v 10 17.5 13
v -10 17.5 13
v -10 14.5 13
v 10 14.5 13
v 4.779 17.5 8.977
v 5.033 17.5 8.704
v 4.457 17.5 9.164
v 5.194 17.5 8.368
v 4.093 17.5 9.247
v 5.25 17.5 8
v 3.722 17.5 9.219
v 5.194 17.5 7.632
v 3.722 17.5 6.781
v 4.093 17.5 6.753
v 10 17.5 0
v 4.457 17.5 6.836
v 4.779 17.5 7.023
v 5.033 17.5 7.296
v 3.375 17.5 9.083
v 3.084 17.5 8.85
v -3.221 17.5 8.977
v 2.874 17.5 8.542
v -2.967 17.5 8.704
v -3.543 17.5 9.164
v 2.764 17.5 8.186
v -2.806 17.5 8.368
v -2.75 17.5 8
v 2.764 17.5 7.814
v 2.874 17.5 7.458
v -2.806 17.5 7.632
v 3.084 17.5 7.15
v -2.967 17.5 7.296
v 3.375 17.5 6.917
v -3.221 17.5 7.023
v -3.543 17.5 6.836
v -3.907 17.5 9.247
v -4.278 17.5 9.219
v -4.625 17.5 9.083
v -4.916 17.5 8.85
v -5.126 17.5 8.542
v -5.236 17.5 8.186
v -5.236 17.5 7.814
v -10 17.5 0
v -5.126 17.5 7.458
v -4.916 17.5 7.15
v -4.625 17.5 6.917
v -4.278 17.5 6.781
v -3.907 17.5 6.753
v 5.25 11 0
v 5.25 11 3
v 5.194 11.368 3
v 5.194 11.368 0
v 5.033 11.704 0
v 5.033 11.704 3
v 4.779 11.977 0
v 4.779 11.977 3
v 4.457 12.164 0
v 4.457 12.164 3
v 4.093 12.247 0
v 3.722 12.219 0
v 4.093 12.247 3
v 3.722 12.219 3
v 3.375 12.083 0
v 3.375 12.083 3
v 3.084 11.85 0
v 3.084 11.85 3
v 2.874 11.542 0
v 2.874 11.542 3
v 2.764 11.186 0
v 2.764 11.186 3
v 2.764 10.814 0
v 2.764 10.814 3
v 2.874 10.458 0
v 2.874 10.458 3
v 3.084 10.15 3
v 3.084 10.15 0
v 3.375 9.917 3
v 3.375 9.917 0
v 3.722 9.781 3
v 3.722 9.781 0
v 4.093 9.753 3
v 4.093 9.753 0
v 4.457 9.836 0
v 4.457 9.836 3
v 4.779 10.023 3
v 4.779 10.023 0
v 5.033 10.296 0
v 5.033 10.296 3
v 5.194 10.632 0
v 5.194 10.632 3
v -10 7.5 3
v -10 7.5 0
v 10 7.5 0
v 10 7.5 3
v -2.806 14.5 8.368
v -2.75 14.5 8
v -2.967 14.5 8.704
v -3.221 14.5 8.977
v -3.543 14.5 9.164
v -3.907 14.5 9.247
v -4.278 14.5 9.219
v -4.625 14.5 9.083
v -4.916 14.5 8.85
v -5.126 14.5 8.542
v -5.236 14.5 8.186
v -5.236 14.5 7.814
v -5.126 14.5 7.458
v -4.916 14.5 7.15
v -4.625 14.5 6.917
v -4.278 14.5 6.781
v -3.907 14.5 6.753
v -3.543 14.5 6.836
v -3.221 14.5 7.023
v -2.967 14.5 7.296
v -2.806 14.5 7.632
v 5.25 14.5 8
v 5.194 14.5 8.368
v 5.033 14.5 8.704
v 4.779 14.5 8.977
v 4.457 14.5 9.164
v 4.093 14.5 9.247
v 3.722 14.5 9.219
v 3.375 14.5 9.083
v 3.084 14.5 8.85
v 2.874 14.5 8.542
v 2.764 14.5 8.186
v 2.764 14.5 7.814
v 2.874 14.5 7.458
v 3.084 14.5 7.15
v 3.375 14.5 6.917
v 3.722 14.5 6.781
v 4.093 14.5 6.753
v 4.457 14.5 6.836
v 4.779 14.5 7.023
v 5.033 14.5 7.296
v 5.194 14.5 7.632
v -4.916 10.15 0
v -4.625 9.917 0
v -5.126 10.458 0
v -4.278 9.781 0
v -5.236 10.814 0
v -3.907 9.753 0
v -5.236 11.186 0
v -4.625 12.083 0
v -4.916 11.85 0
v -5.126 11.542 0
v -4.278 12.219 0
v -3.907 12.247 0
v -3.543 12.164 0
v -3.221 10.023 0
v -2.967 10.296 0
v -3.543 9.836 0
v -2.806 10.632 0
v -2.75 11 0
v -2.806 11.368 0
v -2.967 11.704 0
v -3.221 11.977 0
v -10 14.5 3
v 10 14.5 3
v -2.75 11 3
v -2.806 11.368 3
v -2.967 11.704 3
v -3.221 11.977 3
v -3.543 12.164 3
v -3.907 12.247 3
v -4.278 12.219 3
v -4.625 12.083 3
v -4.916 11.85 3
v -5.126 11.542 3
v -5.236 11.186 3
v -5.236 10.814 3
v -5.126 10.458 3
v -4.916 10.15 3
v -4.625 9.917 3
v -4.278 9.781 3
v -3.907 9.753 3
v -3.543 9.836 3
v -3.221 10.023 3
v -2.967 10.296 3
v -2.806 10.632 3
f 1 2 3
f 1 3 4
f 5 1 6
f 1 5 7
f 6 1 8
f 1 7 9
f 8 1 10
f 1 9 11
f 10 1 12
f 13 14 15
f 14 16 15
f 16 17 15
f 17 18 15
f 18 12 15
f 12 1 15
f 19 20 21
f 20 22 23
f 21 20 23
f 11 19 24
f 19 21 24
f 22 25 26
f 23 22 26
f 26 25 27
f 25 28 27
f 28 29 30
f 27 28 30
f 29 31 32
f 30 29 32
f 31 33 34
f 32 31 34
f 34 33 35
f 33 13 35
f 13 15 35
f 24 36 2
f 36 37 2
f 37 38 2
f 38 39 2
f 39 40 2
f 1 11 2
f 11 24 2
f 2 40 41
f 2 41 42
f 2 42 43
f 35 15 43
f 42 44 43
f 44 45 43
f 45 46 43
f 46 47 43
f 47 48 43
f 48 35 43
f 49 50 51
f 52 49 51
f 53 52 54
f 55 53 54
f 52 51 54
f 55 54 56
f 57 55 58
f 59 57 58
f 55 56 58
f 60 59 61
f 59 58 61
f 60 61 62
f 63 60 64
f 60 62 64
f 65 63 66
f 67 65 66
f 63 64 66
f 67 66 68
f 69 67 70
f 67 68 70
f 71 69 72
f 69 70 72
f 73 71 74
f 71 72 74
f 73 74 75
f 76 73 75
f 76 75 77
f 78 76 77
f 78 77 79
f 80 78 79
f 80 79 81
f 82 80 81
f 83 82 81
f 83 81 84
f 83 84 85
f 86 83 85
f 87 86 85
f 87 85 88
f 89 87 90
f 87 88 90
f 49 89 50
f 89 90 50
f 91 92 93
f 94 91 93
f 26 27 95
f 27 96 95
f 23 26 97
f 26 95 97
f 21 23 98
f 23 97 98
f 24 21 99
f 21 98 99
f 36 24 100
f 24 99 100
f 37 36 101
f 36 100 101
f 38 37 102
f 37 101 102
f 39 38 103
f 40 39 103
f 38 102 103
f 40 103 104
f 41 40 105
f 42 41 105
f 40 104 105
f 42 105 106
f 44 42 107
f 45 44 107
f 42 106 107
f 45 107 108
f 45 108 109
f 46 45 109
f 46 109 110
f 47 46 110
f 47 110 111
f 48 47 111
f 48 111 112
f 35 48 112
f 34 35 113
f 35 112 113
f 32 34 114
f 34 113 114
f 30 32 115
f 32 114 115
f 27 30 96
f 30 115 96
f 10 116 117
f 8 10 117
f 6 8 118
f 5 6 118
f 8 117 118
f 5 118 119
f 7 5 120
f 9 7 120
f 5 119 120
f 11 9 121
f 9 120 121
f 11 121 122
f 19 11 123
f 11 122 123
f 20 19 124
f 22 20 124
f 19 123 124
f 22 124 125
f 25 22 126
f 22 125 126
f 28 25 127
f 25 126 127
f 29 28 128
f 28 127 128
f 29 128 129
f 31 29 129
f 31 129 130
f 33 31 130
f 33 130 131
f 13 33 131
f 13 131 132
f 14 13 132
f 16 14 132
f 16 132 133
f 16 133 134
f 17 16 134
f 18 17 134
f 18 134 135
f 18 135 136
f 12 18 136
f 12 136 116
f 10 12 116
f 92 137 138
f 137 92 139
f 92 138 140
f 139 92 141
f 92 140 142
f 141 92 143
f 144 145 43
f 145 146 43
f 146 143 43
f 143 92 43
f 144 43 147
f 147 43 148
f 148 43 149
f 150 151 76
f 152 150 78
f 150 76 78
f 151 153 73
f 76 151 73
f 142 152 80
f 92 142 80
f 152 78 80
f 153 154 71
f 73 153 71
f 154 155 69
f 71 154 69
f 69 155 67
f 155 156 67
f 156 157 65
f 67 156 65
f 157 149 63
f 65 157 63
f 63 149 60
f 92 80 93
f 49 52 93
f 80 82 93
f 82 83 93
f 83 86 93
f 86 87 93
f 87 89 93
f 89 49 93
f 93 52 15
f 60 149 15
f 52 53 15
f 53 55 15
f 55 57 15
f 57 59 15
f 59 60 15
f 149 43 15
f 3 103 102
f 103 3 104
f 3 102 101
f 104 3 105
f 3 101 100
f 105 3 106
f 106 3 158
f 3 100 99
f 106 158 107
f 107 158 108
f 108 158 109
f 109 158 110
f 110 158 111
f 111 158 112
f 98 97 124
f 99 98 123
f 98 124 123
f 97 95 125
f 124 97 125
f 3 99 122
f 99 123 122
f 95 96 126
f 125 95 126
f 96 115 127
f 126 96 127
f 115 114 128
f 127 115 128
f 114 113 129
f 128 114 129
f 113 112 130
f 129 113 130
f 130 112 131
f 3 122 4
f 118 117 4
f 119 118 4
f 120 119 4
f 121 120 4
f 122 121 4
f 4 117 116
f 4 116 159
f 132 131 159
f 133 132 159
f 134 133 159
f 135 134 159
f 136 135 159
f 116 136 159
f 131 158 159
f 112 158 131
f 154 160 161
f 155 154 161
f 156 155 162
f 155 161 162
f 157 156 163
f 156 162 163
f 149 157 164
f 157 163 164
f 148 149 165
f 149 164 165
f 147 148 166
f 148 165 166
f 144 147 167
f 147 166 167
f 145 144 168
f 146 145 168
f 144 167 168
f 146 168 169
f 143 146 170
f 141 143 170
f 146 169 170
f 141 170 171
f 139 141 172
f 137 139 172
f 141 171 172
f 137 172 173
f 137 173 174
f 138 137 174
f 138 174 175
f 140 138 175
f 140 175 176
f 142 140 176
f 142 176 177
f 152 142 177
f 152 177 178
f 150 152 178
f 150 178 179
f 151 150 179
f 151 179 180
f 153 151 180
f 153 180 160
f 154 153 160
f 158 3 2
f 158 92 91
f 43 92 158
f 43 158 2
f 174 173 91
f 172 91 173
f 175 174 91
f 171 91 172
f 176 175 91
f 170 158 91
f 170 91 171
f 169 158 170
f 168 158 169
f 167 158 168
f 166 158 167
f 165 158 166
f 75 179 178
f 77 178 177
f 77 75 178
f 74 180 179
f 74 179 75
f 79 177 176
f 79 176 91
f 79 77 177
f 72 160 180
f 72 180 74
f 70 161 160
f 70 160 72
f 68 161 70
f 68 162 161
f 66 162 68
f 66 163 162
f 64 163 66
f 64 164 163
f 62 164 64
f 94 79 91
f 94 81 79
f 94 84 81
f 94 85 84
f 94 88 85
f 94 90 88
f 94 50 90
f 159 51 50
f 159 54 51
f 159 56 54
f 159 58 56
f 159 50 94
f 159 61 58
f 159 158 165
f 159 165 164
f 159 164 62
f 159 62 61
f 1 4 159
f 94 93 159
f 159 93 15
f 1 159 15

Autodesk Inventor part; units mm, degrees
ref_plane "YZ Plane" through (0, 0, 0) normal (1, 0, 0) x (0, 1, 0)
ref_plane "XZ Plane" through (0, 0, 0) normal (0, 1, 0) x (-1, 0, 0)
ref_plane "XY Plane" through (0, 0, 0) normal (0, 0, 1) x (1, 0, 0)
ref_plane "작업 평면1" through (0, 0, 0) normal (0, 0, 1) x (1, 0, 0)
sketch "스케치1" plane through (0, 0, 0) normal (0, 0, 1) x (1, 0, 0)
  line L0 (-35, -17.5) -> (35, -17.5) projected
  line L1 (35, -17.5) -> (35, 17.5) projected
  line L2 (35, 17.5) -> (-35, 17.5) projected
  line L3 (-35, 17.5) -> (-35, -17.5) projected
  line L4 (35, -17.5) -> (-35, -17.5) projected
  line L5 (-35, -17.5) -> (-35, -23.5) projected
  line L6 (35, -23.5) -> (-35, -23.5) projected
  line L7 (35, -17.5) -> (35, -23.5) projected
  line L8 (35, 0) -> (10, 0)
  line L9 (-35, 0) -> (-10, 0)
  line L10 (10, 0) -> (-10, 0)
  line L11 (10, 0) -> (10, 17.5)
  line L12 (-10, 0) -> (-10, 17.5)
  line L13 (10, 17.5) -> (-10, 17.5)
  line L14 (-10, 17.5) -> (-10, 7.5)
  line L15 (-10, 7.5) -> (10, 7.5)
  line L16 (10, 7.5) -> (10, 17.5)
  point P0 (0, 0)
  dimension "d0" = 25
  dimension "d1" = 25
  dimension "d2" = 20
  dimension "d3" = 10
extrude "돌출1" add sketch "스케치1" along normal blind 3 contours L2 L11 L15 L12
sketch "스케치2" plane through (0, 0, 3) normal (0, 0, 1) x (1, 0, 0)
  line L0 (10, 7.5) -> (10, 17.5) projected
  line L1 (10, 17.5) -> (-10, 17.5) projected
  line L2 (-10, 17.5) -> (-10, 7.5) projected
  line L3 (-10, 7.5) -> (10, 7.5) projected
  line L4 (10, 17.5) -> (-10, 17.5)
  line L5 (-10, 17.5) -> (-10, 14.5)
  line L6 (-10, 14.5) -> (10, 14.5)
  line L7 (10, 14.5) -> (10, 17.5)
  point P0 (0, 0)
  point P1 (10, 14.5)
  dimension "d6" = 3
extrude "돌출2" add sketch "스케치2" along normal blind 10 contours L6 L2 L1 L0
sketch "스케치3" plane through (0, 0, 3) normal (0, 0, 1) x (1, 0, 0)
  line L0 (10, 14.5) -> (-10, 14.5) projected
  line L1 (-10, 14.5) -> (-10, 7.5) projected
  line L2 (-10, 7.5) -> (10, 7.5) projected
  line L3 (10, 7.5) -> (10, 14.5) projected
  line L4 (10, 11) -> (4, 11)
  line L5 (-10, 11) -> (-4, 11)
  circle A0 centre (4, 11) radius 1.25
  circle A1 centre (-4, 11) radius 1.25
  point P0 (0, 0)
  dimension "d9" = 6
  dimension "d10" = 6
  dimension "d11" = 2.5
  dimension "d12" = 2.5
extrude "돌출3" cut sketch "스케치3" against normal blind 10 contours A1 | A0
sketch "스케치4" plane through (-10, 14.5, 3) normal (0, -1, 0) x (1, 0, 0)
  line L0 (20, 0) -> (0, 0) projected
  line L1 (20, 0) -> (20, 10) projected
  line L2 (0, 10) -> (20, 10) projected
  line L3 (0, 0) -> (0, 10) projected
  line L4 (20, 5) -> (14, 5)
  line L5 (0, 5) -> (6, 5)
  circle A0 centre (14, 5) radius 1.25
  circle A1 centre (6, 5) radius 1.25
  point P0 (10, -3)
  dimension "d15" = 6
  dimension "d16" = 6
  dimension "d17" = 2.5
  dimension "d18" = 2.5
extrude "돌출4" cut sketch "스케치4" against normal blind 10 contours A0 | A1
properties part number "63" material "LCP 플라스틱"
